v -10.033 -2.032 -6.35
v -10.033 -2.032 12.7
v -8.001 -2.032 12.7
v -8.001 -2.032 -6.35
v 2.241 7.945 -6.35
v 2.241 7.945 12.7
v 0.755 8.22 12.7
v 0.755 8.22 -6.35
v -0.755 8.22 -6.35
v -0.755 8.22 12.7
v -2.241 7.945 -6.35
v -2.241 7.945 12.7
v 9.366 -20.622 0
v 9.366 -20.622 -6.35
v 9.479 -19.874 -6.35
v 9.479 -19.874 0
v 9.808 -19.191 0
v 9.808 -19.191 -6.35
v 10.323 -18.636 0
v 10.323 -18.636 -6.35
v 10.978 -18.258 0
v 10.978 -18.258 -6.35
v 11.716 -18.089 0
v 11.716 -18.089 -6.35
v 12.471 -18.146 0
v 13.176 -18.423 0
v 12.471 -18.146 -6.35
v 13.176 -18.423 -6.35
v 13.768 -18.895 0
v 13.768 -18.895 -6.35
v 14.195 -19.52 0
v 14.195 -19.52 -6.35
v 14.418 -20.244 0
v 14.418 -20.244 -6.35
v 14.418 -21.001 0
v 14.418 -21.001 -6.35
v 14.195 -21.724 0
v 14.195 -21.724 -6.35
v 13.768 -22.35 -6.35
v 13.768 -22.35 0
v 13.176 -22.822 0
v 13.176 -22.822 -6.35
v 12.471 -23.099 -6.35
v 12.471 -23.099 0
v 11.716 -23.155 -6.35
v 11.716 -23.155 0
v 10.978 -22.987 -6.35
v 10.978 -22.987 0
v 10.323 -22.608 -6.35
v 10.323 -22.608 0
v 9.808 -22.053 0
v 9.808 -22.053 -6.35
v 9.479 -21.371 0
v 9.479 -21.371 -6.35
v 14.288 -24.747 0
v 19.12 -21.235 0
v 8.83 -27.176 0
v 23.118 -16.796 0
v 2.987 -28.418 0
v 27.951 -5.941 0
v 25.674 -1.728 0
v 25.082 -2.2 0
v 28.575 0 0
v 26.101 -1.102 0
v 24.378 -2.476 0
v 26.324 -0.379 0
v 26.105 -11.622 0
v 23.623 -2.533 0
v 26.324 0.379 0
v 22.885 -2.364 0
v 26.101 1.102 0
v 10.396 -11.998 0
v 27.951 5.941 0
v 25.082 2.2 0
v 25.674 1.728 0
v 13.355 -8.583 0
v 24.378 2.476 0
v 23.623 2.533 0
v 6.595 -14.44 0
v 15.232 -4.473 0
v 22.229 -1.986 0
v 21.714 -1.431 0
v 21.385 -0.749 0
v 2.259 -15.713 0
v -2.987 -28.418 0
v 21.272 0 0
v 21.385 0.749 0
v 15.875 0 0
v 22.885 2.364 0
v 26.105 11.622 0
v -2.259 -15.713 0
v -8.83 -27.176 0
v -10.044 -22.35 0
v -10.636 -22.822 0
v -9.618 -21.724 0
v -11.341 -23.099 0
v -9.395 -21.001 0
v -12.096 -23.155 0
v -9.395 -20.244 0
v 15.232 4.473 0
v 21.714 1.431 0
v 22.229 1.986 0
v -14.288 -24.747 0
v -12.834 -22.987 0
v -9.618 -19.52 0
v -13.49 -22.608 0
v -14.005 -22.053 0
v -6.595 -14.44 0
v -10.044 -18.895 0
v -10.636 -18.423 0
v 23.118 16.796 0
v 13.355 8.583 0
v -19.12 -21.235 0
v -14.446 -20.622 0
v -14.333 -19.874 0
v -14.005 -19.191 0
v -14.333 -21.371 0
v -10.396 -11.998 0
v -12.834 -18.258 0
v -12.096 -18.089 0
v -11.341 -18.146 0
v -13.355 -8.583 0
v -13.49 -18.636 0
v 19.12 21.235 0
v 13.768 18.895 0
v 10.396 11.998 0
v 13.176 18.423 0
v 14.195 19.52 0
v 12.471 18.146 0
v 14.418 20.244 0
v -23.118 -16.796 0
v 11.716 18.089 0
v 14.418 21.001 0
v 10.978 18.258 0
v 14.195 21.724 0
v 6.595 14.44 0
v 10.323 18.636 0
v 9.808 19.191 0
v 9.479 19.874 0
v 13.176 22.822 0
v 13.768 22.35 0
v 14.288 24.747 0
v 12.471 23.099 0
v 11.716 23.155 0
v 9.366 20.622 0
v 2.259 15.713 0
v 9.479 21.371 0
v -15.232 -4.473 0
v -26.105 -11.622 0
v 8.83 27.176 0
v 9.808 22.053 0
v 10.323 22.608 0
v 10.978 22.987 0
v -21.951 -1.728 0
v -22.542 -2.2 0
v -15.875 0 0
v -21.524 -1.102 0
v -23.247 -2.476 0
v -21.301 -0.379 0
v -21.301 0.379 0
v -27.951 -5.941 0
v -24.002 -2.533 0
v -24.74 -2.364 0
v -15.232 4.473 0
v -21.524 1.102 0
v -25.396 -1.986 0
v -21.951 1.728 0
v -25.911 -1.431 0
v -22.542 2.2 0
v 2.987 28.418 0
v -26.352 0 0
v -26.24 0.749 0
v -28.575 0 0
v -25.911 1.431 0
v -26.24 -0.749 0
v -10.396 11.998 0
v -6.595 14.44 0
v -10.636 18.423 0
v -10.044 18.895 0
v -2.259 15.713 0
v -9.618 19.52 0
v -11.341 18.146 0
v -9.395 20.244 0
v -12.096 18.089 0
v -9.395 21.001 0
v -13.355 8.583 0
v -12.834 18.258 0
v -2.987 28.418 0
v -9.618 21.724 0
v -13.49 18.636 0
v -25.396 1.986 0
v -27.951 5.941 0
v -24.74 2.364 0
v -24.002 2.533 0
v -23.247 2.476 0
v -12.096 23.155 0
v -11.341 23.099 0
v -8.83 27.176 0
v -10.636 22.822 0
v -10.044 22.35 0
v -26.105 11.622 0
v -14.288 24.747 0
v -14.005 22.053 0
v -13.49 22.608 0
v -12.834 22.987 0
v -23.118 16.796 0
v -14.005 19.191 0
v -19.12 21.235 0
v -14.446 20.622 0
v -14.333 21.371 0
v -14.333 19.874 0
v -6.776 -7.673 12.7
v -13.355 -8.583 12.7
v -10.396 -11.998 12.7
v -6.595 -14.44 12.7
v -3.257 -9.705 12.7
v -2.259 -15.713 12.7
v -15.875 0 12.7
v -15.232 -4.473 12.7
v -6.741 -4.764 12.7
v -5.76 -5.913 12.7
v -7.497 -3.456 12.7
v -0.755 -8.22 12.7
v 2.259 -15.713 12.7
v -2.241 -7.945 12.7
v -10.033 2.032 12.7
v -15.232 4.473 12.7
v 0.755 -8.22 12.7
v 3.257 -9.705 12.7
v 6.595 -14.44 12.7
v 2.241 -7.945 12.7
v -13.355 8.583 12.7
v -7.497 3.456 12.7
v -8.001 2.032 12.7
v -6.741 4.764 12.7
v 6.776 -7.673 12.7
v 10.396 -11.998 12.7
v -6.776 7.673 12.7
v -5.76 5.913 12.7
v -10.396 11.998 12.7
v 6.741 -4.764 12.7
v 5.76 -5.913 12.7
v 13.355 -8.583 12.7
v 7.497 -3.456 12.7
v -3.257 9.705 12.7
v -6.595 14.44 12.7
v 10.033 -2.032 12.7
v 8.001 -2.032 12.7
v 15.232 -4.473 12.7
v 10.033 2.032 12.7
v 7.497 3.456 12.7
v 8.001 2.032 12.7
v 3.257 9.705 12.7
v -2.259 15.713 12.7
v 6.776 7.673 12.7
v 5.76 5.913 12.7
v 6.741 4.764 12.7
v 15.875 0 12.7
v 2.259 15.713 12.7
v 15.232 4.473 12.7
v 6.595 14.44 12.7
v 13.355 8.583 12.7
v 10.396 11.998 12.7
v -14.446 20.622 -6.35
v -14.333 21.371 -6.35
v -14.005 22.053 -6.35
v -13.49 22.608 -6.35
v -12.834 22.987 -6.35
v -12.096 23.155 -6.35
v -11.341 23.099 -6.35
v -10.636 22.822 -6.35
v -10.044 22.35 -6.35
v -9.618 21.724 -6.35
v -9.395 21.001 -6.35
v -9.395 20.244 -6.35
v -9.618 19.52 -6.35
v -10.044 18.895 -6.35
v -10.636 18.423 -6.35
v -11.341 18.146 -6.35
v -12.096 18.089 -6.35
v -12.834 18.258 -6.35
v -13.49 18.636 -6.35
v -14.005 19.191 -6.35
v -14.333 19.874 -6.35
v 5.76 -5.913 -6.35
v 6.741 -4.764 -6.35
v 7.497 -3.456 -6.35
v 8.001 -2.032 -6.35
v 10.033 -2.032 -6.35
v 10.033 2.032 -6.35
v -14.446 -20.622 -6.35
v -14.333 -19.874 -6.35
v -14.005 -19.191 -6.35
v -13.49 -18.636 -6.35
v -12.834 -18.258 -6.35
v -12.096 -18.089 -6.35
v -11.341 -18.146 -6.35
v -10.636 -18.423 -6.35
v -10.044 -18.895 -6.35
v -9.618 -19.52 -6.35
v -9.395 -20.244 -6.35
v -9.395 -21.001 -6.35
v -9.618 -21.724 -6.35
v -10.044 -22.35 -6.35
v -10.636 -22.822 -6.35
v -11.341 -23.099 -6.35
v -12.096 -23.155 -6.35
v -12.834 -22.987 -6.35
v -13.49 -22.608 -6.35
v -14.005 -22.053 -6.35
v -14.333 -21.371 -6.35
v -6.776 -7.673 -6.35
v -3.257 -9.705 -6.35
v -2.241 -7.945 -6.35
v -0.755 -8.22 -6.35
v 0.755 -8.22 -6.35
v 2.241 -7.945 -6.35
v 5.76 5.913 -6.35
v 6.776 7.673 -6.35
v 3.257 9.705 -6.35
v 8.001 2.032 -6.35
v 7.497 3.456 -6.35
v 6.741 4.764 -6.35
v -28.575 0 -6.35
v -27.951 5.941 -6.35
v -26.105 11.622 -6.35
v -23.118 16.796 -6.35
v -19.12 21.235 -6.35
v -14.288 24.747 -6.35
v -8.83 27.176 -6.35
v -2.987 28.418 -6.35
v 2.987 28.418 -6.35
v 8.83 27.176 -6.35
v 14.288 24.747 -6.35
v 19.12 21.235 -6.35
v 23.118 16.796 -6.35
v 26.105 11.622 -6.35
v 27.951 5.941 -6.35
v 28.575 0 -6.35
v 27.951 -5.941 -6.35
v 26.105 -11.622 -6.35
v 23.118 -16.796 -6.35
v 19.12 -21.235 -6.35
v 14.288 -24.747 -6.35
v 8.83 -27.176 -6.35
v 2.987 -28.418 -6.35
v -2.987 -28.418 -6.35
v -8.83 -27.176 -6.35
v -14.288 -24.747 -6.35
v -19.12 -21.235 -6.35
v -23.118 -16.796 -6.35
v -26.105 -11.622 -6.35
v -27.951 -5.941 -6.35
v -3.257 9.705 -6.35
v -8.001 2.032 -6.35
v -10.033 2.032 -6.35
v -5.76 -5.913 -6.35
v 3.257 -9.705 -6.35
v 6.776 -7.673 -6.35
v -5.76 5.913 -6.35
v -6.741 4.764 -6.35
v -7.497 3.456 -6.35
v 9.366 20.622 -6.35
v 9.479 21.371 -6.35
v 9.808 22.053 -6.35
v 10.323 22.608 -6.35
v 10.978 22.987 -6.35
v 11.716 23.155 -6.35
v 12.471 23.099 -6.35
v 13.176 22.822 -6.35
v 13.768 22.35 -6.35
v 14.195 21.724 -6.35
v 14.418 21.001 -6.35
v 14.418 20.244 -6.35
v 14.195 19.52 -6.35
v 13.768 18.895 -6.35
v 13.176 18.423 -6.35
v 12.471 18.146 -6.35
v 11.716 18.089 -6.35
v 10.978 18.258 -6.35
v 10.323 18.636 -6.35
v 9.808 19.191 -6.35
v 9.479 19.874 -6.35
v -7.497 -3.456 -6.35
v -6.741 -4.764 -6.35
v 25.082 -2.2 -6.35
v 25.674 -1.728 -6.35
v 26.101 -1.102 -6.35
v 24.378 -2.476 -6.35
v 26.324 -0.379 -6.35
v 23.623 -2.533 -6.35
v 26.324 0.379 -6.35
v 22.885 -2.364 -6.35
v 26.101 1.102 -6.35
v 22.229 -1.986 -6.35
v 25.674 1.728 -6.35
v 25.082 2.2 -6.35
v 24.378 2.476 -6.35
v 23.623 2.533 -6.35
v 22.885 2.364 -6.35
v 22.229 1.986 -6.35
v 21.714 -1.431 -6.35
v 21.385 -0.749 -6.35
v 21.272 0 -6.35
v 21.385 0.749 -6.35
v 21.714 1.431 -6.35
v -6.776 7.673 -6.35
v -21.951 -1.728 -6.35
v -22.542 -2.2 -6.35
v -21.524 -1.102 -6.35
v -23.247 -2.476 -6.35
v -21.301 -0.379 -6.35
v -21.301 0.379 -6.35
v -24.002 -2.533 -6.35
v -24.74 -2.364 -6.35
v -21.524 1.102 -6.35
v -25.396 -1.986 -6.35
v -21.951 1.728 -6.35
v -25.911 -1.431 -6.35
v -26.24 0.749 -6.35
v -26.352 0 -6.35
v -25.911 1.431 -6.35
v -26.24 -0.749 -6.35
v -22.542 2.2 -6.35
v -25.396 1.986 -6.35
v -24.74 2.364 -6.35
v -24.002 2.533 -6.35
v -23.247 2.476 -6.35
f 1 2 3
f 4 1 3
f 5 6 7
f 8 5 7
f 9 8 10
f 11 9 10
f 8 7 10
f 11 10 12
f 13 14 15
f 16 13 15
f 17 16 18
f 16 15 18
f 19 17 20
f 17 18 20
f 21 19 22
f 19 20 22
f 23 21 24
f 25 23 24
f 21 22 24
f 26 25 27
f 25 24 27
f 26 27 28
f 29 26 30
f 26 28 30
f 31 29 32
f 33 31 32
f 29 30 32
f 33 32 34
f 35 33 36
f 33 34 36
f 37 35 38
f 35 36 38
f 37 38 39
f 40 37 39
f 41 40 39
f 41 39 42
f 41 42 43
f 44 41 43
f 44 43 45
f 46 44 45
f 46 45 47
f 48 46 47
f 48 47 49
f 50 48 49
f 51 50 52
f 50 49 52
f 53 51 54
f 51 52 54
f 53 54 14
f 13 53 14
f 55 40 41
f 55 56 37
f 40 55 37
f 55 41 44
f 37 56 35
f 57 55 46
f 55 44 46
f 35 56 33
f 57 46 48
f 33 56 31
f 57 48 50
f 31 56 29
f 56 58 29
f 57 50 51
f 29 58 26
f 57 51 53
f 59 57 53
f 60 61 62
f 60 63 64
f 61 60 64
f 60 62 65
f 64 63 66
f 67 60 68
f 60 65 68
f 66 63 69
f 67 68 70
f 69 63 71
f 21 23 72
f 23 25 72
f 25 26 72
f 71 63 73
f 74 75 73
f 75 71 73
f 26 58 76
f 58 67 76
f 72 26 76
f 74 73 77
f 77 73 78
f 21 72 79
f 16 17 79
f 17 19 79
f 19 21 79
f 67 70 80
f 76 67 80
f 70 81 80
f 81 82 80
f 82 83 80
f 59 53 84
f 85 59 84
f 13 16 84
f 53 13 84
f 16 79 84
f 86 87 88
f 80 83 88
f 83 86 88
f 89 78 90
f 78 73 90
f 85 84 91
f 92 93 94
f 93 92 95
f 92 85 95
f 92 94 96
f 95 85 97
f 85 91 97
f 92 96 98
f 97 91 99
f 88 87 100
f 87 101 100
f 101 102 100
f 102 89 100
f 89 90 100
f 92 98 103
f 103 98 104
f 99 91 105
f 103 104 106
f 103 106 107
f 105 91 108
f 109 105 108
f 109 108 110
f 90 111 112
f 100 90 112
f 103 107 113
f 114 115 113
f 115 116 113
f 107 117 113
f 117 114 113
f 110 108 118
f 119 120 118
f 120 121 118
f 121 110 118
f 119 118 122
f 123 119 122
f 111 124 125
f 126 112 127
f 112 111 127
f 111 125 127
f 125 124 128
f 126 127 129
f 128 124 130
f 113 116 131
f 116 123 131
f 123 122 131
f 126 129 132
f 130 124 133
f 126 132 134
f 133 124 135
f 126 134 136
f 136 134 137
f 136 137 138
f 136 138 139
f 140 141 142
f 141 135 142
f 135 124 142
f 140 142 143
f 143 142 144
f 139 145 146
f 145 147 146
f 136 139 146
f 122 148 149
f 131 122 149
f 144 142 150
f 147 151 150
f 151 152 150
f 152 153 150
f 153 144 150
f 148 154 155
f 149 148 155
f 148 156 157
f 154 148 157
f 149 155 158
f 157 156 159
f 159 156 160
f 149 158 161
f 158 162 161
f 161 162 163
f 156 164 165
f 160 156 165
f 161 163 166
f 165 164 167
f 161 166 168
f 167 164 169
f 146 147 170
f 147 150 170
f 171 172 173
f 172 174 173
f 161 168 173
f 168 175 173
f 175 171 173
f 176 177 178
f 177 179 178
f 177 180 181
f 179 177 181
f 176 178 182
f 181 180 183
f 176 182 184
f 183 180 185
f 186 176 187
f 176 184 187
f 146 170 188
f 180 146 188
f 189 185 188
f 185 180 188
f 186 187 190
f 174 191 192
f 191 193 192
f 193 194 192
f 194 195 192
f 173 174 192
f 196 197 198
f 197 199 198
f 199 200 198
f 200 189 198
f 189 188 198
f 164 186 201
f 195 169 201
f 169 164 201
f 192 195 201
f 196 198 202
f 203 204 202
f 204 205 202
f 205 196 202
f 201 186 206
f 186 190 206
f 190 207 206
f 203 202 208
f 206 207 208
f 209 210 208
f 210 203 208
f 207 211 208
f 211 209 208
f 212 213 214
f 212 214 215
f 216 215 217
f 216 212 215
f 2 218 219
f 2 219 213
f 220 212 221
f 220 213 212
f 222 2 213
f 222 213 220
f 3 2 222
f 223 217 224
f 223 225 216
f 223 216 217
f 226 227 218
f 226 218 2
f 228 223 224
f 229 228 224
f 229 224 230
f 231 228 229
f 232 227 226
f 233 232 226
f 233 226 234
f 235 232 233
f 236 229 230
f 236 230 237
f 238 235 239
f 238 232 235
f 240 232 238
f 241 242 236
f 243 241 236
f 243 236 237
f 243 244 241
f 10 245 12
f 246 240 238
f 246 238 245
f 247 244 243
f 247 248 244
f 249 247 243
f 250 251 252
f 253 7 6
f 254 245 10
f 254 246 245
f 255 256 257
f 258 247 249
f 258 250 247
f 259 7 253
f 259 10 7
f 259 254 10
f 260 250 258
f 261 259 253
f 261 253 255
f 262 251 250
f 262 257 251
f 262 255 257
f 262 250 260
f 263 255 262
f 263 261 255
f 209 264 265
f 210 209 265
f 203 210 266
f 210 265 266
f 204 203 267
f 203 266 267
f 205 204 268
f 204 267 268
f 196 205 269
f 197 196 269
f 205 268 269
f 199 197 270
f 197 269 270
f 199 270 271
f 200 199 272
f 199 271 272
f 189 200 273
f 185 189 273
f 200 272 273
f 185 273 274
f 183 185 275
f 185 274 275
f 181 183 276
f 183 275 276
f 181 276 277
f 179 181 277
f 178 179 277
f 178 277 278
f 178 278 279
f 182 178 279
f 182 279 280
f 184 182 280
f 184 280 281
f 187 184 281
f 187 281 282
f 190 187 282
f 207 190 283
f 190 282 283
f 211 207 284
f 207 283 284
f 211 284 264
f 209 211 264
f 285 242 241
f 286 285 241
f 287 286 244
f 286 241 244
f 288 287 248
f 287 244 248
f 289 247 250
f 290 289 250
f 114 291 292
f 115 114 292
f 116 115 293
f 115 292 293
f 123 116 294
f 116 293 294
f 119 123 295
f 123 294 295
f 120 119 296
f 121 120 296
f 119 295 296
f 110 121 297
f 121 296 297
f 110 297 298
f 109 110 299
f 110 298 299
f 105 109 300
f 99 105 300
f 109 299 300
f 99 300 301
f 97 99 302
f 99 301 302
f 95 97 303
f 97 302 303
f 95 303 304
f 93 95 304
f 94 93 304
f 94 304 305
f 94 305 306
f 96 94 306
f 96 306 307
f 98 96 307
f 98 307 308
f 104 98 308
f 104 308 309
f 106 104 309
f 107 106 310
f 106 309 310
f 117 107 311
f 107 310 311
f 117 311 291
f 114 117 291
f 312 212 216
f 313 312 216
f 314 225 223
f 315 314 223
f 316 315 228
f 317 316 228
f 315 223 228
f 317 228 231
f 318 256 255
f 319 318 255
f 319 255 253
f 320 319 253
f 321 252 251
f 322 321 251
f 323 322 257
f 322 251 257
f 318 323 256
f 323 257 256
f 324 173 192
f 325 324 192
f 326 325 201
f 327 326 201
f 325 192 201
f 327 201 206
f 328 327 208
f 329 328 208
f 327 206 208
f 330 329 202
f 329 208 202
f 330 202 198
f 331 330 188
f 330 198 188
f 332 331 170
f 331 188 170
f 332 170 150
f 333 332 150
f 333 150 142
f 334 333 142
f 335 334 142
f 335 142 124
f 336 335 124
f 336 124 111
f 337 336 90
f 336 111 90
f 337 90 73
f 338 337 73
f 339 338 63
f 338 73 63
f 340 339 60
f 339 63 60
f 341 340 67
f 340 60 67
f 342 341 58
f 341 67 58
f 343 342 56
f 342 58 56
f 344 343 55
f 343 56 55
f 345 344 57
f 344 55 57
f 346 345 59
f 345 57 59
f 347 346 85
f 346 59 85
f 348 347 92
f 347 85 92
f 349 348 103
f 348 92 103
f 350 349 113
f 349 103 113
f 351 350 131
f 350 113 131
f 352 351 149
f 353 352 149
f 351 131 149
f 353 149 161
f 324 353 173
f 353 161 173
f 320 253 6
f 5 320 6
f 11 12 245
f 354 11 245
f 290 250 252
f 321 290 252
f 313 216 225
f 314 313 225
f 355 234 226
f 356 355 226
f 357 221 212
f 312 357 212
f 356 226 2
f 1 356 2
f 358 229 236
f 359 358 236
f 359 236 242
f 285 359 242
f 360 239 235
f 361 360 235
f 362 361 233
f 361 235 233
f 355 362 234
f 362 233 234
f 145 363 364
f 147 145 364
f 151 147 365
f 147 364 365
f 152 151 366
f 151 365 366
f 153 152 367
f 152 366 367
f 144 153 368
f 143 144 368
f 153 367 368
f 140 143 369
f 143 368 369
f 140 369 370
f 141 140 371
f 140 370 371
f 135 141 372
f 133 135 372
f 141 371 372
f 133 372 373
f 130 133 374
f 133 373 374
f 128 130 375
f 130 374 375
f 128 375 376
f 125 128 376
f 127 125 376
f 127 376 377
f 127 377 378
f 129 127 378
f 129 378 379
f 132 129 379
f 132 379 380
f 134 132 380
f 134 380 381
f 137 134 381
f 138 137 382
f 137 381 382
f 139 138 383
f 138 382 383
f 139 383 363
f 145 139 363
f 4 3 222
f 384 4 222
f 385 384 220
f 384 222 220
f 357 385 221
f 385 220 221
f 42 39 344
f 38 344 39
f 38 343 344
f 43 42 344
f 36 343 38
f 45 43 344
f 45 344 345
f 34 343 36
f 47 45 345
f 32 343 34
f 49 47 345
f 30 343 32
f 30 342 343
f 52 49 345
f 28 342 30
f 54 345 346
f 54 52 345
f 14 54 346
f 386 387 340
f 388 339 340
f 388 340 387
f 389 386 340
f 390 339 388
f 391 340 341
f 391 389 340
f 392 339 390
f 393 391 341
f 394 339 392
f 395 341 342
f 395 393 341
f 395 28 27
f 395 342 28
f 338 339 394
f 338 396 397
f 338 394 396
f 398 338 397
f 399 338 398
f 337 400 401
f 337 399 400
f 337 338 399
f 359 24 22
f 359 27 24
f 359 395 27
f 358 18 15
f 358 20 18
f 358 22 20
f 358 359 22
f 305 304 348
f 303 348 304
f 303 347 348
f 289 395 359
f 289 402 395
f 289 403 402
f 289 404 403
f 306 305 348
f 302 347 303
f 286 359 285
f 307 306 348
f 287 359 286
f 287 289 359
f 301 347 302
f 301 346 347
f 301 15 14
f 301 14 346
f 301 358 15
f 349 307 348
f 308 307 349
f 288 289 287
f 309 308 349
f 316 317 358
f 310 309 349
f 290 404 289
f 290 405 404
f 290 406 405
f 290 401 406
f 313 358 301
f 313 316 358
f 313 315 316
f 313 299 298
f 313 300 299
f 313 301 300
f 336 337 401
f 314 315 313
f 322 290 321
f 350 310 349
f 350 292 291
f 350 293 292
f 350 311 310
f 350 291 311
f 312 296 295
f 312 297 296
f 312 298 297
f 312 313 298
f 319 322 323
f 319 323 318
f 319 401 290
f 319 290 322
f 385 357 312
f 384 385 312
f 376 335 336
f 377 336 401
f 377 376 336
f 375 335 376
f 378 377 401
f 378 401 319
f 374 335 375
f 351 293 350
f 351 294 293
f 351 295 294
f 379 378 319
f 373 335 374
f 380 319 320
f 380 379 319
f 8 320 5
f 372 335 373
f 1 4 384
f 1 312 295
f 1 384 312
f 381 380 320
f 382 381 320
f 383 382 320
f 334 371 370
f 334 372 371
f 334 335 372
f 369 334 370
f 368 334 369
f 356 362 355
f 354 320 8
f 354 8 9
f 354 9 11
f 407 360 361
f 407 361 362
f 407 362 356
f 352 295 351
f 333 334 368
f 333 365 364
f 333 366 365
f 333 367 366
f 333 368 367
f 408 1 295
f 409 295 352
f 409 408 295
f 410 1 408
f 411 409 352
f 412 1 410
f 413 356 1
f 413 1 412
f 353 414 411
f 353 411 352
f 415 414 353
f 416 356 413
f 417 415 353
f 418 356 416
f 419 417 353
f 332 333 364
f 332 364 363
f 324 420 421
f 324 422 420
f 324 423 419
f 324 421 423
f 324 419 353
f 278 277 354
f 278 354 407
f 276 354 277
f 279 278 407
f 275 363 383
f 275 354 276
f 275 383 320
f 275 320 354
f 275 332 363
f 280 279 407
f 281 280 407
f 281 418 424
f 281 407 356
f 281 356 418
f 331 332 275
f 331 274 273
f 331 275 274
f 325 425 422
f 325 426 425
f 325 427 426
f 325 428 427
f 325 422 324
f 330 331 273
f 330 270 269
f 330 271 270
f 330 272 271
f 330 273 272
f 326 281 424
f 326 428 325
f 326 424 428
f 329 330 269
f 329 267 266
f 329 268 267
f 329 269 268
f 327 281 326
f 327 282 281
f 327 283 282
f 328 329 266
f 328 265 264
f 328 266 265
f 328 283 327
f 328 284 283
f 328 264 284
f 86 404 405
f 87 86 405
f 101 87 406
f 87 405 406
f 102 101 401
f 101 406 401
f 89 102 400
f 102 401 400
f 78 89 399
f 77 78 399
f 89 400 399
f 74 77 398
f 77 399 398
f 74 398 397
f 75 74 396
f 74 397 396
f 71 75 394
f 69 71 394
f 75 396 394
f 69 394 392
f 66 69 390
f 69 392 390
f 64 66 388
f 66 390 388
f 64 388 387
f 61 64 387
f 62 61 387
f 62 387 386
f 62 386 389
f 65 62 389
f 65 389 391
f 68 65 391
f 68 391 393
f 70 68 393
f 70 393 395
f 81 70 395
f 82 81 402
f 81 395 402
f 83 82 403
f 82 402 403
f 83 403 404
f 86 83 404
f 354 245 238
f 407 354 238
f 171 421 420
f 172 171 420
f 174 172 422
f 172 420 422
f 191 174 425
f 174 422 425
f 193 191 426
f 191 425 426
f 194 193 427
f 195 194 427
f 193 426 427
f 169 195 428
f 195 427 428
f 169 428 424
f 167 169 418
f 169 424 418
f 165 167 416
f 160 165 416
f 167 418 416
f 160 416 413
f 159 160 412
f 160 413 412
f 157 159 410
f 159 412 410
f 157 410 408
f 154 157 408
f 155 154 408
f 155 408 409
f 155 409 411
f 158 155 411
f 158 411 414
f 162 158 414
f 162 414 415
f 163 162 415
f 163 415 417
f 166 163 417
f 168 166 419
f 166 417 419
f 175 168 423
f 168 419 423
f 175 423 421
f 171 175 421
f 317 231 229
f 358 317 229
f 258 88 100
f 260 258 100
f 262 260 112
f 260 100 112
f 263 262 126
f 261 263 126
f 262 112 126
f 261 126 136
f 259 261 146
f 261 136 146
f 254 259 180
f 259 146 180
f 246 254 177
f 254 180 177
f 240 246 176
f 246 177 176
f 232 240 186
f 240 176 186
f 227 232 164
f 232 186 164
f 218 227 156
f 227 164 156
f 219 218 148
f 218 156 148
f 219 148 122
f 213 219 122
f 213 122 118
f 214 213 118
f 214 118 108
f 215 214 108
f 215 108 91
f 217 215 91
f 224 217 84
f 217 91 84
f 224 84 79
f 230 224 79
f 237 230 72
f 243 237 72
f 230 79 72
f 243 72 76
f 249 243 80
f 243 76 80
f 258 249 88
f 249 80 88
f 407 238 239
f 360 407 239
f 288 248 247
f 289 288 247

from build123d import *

# Parameters (mm, degrees)
SKETCH1_R           = 15.875
BOSS_EXTRUDE1_DEPTH = 12.7
SKETCH4_R           = 28.575
BOSS_EXTRUDE3_DEPTH = 6.35
CUT_EXTRUDE2_DEPTH  = 19.05
SKETCH6_R           = 2.54
CUT_EXTRUDE3_DEPTH  = 6.35


with BuildPart() as part:
    # Sketch1 → Boss-Extrude1 (new body)
    with BuildSketch(Plane.XY):
        Circle(SKETCH1_R)
    extrude(amount=BOSS_EXTRUDE1_DEPTH)

    # Sketch4 → Boss-Extrude3 (add)
    with BuildSketch(Plane(origin=(0, 0, 0), x_dir=(-1, 0, 0), z_dir=(0, 0, -1))):
        Circle(SKETCH4_R)
    extrude(amount=BOSS_EXTRUDE3_DEPTH)

    # Sketch5 → Cut-Extrude2 (cut)
    with BuildSketch(Plane.XY.offset(12.7)):
        with BuildLine():
            Line((6.77626362, -7.672832876), (5.76026362, -5.913069256))
            ThreePointArc((5.76026362, -5.913069256), (7.149039708, -4.1275), (8.001, -2.032))
            Line((8.001, -2.032), (10.033, -2.032))
            Line((10.033, -2.032), (10.033, 2.032))
            Line((10.033, 2.032), (8.001, 2.032))
            ThreePointArc((8.001, 2.032), (7.149039708, 4.1275), (5.76026362, 5.913069256))
            Line((5.76026362, 5.913069256), (6.77626362, 7.672832876))
            Line((6.77626362, 7.672832876), (3.25673638, 9.704832876))
            Line((3.25673638, 9.704832876), (2.24073638, 7.945069256))
            ThreePointArc((2.24073638, 7.945069256), (0, 8.255), (-2.24073638, 7.945069256))
            Line((-2.24073638, 7.945069256), (-3.25673638, 9.704832876))
            Line((-3.25673638, 9.704832876), (-6.77626362, 7.672832876))
            Line((-6.77626362, 7.672832876), (-5.76026362, 5.913069256))
            ThreePointArc((-5.76026362, 5.913069256), (-7.149039708, 4.1275), (-8.001, 2.032))
            Line((-8.001, 2.032), (-10.033, 2.032))
            Line((-10.033, 2.032), (-10.033, -2.032))
            Line((-10.033, -2.032), (-8.001, -2.032))
            ThreePointArc((-8.001, -2.032), (-7.149039708, -4.1275), (-5.76026362, -5.913069256))
            Line((-5.76026362, -5.913069256), (-6.77626362, -7.672832876))
            Line((-6.77626362, -7.672832876), (-3.25673638, -9.704832876))
            Line((-3.25673638, -9.704832876), (-2.24073638, -7.945069256))
            ThreePointArc((-2.24073638, -7.945069256), (0, -8.255), (2.24073638, -7.945069256))
            Line((2.24073638, -7.945069256), (3.25673638, -9.704832876))
            Line((3.25673638, -9.704832876), (6.77626362, -7.672832876))
        make_face()
    extrude(amount=-CUT_EXTRUDE2_DEPTH, mode=Mode.SUBTRACT)

    # Sketch6 → Cut-Extrude3 (cut)
    with BuildSketch(Plane(origin=(0, 0, -6.35), x_dir=(-1, 0, 0), z_dir=(0, 0, -1))):
        with Locations((-23.8125, 0)):
            Circle(SKETCH6_R)
        with Locations((-11.90625, 20.622229928)):
            Circle(SKETCH6_R)
        with Locations((11.90625, 20.622229928)):
            Circle(SKETCH6_R)
        with Locations((23.8125, 0)):
            Circle(SKETCH6_R)
        with Locations((11.90625, -20.622229928)):
            Circle(SKETCH6_R)
        with Locations((-11.90625, -20.622229928)):
            Circle(SKETCH6_R)
    extrude(amount=-CUT_EXTRUDE3_DEPTH, mode=Mode.SUBTRACT)


solid = part.part
